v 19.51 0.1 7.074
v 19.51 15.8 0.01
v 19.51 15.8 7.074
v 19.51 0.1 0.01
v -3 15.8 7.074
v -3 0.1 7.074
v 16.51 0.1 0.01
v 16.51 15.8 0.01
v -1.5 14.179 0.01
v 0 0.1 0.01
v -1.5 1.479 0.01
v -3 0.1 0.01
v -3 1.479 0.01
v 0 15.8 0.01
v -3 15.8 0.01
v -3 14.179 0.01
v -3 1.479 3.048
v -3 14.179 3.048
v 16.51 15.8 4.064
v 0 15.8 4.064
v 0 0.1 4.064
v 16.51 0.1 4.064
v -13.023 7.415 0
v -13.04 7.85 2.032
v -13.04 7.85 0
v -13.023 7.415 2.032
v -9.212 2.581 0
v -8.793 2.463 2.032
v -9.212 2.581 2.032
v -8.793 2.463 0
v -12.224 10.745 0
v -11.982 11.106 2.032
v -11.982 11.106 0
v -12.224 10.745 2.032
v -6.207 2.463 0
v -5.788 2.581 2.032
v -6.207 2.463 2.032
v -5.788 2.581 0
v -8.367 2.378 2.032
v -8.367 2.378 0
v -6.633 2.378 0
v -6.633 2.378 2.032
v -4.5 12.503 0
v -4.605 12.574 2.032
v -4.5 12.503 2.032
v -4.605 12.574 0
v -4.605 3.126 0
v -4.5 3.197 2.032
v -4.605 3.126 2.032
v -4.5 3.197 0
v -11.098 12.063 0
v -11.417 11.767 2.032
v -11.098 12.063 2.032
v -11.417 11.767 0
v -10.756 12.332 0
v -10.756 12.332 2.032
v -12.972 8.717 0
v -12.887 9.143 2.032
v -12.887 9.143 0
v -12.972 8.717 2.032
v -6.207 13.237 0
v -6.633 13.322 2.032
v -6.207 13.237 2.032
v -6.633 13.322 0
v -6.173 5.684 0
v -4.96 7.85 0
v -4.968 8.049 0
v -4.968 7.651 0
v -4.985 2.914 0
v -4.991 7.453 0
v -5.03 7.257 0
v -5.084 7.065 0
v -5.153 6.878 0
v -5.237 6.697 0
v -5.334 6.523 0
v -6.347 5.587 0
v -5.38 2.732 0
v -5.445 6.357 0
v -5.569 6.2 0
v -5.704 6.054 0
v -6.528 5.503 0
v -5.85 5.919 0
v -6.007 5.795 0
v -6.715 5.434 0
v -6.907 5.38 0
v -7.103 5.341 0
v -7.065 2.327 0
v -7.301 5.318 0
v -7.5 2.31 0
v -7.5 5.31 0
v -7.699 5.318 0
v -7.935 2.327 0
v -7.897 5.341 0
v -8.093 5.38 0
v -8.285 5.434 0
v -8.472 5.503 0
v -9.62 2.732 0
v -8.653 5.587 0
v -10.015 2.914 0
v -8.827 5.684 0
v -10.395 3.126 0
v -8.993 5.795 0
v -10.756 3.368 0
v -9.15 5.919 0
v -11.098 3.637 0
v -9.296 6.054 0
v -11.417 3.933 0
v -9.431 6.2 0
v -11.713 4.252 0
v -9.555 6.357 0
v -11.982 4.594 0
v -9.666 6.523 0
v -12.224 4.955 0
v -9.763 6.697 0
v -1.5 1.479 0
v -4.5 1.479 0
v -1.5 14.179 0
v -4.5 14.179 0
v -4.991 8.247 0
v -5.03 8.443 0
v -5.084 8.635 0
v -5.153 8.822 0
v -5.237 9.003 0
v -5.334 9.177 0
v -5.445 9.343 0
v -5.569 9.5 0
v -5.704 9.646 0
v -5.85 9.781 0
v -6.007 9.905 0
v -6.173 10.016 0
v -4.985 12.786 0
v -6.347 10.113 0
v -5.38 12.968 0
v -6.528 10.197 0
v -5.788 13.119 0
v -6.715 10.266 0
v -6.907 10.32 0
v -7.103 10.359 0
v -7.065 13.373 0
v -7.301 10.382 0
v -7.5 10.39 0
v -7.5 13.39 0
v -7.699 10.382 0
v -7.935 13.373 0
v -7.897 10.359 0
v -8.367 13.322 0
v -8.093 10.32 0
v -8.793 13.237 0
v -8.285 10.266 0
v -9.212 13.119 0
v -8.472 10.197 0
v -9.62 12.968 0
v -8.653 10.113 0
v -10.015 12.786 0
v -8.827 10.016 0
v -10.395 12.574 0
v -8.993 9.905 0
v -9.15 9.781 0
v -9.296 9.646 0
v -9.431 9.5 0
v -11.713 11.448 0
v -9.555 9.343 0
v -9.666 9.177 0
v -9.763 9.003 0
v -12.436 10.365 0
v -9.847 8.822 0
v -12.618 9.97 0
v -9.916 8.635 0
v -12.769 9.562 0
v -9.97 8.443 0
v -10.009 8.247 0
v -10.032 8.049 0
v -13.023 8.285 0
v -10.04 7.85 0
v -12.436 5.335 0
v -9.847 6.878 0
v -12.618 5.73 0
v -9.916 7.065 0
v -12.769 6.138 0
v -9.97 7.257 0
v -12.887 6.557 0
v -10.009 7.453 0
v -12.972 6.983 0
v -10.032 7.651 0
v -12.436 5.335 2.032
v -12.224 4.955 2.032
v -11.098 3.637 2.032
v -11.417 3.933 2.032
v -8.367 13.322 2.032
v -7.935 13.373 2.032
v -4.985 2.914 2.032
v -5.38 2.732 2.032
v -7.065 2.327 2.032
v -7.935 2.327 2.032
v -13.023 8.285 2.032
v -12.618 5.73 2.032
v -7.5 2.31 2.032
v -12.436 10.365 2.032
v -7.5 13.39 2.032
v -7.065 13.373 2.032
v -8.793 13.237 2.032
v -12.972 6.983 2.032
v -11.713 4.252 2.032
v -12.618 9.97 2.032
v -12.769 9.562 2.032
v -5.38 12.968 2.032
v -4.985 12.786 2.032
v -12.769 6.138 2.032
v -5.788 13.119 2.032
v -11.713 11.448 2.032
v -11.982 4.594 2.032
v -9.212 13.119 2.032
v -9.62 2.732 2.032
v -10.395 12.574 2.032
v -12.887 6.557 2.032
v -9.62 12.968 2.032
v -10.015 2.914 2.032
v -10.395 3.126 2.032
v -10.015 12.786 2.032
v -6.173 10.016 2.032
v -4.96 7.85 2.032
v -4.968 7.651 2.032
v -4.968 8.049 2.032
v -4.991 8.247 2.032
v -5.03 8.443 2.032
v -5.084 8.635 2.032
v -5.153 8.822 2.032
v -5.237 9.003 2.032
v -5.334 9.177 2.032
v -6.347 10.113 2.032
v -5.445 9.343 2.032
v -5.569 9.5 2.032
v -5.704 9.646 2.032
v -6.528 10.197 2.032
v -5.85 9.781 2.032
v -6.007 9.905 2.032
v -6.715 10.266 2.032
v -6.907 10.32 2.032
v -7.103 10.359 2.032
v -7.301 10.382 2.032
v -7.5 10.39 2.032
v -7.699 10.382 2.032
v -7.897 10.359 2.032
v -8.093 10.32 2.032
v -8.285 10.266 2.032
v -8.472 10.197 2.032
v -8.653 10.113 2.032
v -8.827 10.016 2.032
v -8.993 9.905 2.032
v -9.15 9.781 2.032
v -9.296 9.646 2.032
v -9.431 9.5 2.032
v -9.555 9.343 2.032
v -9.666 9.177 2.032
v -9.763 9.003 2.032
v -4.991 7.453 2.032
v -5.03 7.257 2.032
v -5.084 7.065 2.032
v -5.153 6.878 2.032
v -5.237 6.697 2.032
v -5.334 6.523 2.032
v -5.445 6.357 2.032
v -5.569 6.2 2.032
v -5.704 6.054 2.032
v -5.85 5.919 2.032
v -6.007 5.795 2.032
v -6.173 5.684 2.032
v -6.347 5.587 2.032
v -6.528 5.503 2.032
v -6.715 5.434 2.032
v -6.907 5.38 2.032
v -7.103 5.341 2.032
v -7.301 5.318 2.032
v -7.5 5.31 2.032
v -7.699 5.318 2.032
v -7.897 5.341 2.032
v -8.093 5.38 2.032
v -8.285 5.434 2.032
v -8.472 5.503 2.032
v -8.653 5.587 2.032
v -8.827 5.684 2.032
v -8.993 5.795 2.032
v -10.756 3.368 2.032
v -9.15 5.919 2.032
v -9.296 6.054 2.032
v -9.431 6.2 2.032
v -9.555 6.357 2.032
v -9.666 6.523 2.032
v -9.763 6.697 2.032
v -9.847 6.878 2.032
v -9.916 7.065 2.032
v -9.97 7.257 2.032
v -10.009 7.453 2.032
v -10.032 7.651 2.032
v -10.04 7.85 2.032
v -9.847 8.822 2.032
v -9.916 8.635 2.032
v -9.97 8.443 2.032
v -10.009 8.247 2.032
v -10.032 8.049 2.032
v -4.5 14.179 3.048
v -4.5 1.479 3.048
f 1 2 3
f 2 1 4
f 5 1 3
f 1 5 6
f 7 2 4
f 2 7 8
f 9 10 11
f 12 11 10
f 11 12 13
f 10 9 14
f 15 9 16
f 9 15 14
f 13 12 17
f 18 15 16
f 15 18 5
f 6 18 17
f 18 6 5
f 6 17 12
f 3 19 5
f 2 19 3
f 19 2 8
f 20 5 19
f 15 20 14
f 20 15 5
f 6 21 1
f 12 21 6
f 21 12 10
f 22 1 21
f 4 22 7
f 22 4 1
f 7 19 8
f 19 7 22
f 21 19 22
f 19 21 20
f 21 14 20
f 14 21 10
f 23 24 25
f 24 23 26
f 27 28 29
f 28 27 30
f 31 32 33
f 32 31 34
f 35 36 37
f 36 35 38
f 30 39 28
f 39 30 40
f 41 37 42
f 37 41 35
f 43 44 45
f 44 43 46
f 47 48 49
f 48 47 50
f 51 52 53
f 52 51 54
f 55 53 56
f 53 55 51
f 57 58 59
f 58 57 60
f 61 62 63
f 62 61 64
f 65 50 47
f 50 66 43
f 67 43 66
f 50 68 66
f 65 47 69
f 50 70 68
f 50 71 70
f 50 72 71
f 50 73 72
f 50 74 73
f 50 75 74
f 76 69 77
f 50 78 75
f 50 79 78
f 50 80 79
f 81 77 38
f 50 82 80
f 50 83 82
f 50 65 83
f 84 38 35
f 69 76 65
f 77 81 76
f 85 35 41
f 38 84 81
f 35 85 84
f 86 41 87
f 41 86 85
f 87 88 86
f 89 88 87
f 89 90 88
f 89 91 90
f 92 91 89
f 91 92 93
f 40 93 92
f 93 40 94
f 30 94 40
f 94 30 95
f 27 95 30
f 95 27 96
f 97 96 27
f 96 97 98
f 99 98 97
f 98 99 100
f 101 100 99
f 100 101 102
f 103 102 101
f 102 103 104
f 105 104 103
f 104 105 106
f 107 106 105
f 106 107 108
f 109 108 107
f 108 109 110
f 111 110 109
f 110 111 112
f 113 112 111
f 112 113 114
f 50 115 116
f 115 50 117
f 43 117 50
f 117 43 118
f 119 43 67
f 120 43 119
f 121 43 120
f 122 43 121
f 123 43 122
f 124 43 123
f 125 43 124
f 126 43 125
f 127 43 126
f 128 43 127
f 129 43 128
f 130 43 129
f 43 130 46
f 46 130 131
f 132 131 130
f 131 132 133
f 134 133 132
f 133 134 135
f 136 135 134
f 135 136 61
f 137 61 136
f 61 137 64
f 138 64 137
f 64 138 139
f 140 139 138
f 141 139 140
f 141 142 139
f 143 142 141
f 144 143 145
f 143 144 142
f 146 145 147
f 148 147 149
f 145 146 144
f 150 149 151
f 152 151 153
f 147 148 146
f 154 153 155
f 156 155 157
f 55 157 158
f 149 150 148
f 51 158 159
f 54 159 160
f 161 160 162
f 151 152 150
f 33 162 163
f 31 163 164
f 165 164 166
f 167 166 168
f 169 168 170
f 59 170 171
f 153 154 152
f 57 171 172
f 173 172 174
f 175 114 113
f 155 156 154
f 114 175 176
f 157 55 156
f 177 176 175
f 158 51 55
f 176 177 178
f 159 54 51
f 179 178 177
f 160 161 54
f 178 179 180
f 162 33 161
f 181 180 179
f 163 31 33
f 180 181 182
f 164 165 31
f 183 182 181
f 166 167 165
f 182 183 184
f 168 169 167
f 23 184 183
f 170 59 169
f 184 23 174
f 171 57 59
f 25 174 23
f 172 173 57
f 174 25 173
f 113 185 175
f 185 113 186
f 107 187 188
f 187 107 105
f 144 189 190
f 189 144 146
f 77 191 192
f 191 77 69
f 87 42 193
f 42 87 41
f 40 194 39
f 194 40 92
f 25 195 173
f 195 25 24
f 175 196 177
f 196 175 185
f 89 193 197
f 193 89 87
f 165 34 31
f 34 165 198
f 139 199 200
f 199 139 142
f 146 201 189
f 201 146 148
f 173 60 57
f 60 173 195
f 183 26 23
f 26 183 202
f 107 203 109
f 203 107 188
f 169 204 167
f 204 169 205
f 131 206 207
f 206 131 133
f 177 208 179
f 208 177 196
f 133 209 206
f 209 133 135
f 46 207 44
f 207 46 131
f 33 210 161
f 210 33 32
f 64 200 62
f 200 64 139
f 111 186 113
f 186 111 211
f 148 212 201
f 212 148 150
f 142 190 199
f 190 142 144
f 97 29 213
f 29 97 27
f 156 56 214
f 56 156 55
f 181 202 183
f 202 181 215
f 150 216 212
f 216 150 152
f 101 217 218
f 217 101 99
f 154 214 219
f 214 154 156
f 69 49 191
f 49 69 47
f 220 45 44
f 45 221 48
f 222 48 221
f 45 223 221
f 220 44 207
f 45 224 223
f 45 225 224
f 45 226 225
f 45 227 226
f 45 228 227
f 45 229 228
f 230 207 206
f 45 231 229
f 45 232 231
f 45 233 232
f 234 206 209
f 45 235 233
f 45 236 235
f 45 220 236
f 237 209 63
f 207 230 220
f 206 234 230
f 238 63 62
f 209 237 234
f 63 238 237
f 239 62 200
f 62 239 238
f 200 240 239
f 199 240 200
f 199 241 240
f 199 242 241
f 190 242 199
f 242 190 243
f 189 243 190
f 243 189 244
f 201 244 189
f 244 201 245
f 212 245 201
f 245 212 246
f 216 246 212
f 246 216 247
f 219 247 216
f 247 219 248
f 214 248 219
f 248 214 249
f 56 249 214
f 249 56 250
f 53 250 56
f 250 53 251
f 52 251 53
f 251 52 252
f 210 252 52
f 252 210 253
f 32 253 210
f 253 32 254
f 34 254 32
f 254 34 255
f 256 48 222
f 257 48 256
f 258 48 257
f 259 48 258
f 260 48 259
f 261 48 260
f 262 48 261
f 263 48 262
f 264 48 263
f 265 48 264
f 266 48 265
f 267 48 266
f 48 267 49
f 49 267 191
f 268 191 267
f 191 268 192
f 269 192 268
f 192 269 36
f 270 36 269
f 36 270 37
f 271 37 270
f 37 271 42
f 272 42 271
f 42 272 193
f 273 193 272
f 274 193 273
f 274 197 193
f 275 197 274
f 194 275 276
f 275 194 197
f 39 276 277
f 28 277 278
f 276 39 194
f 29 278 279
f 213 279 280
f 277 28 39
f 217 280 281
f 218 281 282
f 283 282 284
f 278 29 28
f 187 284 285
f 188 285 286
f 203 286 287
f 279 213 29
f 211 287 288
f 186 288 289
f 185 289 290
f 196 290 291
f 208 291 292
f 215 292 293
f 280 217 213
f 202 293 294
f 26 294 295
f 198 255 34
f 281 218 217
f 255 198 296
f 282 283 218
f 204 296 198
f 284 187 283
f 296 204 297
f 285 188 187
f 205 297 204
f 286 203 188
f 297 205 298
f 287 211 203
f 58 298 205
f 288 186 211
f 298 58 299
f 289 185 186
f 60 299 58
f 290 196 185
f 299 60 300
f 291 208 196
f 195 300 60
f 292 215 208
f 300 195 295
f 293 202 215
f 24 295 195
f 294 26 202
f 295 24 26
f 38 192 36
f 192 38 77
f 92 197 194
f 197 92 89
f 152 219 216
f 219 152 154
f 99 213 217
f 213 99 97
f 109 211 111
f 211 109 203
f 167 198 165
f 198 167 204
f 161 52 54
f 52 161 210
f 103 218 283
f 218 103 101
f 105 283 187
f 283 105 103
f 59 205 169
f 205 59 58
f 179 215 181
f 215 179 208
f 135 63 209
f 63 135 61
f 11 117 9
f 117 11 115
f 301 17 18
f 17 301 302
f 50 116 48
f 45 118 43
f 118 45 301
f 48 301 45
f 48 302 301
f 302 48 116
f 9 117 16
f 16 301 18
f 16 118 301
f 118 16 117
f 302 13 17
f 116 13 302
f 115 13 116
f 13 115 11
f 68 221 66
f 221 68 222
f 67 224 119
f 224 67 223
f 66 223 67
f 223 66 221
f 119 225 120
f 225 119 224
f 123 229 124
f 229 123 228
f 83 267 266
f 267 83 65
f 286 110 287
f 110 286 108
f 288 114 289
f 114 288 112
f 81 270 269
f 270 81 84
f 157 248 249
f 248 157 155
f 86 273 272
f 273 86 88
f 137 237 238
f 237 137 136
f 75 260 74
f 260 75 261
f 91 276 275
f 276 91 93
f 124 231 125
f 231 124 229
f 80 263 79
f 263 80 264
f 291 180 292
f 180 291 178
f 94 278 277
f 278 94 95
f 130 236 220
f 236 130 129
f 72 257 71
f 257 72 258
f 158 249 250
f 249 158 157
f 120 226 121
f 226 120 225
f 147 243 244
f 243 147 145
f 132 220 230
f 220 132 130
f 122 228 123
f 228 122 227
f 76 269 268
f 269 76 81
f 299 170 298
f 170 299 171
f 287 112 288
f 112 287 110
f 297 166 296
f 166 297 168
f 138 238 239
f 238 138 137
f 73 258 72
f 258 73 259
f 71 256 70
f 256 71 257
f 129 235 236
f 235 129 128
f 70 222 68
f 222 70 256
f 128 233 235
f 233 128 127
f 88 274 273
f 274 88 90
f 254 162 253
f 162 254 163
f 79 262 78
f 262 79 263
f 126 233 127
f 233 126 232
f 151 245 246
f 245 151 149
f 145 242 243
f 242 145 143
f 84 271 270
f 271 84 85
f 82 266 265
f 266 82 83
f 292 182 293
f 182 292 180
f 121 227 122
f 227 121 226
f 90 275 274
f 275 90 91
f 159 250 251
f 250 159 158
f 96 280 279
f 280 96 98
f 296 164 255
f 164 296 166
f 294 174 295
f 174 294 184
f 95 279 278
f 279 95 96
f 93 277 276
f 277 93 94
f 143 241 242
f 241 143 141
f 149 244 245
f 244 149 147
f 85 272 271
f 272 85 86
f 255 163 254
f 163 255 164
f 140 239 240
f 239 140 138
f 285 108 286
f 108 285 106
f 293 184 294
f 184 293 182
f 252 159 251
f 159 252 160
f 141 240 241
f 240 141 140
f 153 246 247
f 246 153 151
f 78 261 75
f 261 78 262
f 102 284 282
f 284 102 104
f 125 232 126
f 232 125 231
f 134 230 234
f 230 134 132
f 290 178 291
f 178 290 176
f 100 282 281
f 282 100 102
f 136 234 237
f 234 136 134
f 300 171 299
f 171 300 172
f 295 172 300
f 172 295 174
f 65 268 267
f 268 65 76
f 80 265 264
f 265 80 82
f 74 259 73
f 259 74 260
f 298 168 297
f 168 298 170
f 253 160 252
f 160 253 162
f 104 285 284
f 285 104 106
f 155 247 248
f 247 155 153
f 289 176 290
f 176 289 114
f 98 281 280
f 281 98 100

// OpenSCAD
INCHES = 25.4;
STRIP_WIDTH = 0.65*INCHES;
STRIP_THICKNESS = 0.16*INCHES;
CLIP_LENGTH = 0.5*INCHES;
THICKNESS=3;
difference() {
	translate([-THICKNESS, 0.1, 0.01]) cube(size=[STRIP_WIDTH+THICKNESS*2, CLIP_LENGTH+THICKNESS, STRIP_THICKNESS+THICKNESS]);
	cube(size=[STRIP_WIDTH, CLIP_LENGTH*2, STRIP_THICKNESS]);
}


translate([-THICKNESS*2.5, CLIP_LENGTH/2+THICKNESS/2, 0]) difference() {
	union() {
		cylinder(r=0.1*INCHES+THICKNESS, h=STRIP_THICKNESS/2, $fn=80);
		translate([THICKNESS, -(0.1*INCHES+THICKNESS)*1.15, 0]) cube(size=[THICKNESS, CLIP_LENGTH, STRIP_THICKNESS*0.75]);
	}
	translate([0, 0, -0.1]) cylinder(r=0.1*INCHES, h=STRIP_THICKNESS, $fn=80);
}
